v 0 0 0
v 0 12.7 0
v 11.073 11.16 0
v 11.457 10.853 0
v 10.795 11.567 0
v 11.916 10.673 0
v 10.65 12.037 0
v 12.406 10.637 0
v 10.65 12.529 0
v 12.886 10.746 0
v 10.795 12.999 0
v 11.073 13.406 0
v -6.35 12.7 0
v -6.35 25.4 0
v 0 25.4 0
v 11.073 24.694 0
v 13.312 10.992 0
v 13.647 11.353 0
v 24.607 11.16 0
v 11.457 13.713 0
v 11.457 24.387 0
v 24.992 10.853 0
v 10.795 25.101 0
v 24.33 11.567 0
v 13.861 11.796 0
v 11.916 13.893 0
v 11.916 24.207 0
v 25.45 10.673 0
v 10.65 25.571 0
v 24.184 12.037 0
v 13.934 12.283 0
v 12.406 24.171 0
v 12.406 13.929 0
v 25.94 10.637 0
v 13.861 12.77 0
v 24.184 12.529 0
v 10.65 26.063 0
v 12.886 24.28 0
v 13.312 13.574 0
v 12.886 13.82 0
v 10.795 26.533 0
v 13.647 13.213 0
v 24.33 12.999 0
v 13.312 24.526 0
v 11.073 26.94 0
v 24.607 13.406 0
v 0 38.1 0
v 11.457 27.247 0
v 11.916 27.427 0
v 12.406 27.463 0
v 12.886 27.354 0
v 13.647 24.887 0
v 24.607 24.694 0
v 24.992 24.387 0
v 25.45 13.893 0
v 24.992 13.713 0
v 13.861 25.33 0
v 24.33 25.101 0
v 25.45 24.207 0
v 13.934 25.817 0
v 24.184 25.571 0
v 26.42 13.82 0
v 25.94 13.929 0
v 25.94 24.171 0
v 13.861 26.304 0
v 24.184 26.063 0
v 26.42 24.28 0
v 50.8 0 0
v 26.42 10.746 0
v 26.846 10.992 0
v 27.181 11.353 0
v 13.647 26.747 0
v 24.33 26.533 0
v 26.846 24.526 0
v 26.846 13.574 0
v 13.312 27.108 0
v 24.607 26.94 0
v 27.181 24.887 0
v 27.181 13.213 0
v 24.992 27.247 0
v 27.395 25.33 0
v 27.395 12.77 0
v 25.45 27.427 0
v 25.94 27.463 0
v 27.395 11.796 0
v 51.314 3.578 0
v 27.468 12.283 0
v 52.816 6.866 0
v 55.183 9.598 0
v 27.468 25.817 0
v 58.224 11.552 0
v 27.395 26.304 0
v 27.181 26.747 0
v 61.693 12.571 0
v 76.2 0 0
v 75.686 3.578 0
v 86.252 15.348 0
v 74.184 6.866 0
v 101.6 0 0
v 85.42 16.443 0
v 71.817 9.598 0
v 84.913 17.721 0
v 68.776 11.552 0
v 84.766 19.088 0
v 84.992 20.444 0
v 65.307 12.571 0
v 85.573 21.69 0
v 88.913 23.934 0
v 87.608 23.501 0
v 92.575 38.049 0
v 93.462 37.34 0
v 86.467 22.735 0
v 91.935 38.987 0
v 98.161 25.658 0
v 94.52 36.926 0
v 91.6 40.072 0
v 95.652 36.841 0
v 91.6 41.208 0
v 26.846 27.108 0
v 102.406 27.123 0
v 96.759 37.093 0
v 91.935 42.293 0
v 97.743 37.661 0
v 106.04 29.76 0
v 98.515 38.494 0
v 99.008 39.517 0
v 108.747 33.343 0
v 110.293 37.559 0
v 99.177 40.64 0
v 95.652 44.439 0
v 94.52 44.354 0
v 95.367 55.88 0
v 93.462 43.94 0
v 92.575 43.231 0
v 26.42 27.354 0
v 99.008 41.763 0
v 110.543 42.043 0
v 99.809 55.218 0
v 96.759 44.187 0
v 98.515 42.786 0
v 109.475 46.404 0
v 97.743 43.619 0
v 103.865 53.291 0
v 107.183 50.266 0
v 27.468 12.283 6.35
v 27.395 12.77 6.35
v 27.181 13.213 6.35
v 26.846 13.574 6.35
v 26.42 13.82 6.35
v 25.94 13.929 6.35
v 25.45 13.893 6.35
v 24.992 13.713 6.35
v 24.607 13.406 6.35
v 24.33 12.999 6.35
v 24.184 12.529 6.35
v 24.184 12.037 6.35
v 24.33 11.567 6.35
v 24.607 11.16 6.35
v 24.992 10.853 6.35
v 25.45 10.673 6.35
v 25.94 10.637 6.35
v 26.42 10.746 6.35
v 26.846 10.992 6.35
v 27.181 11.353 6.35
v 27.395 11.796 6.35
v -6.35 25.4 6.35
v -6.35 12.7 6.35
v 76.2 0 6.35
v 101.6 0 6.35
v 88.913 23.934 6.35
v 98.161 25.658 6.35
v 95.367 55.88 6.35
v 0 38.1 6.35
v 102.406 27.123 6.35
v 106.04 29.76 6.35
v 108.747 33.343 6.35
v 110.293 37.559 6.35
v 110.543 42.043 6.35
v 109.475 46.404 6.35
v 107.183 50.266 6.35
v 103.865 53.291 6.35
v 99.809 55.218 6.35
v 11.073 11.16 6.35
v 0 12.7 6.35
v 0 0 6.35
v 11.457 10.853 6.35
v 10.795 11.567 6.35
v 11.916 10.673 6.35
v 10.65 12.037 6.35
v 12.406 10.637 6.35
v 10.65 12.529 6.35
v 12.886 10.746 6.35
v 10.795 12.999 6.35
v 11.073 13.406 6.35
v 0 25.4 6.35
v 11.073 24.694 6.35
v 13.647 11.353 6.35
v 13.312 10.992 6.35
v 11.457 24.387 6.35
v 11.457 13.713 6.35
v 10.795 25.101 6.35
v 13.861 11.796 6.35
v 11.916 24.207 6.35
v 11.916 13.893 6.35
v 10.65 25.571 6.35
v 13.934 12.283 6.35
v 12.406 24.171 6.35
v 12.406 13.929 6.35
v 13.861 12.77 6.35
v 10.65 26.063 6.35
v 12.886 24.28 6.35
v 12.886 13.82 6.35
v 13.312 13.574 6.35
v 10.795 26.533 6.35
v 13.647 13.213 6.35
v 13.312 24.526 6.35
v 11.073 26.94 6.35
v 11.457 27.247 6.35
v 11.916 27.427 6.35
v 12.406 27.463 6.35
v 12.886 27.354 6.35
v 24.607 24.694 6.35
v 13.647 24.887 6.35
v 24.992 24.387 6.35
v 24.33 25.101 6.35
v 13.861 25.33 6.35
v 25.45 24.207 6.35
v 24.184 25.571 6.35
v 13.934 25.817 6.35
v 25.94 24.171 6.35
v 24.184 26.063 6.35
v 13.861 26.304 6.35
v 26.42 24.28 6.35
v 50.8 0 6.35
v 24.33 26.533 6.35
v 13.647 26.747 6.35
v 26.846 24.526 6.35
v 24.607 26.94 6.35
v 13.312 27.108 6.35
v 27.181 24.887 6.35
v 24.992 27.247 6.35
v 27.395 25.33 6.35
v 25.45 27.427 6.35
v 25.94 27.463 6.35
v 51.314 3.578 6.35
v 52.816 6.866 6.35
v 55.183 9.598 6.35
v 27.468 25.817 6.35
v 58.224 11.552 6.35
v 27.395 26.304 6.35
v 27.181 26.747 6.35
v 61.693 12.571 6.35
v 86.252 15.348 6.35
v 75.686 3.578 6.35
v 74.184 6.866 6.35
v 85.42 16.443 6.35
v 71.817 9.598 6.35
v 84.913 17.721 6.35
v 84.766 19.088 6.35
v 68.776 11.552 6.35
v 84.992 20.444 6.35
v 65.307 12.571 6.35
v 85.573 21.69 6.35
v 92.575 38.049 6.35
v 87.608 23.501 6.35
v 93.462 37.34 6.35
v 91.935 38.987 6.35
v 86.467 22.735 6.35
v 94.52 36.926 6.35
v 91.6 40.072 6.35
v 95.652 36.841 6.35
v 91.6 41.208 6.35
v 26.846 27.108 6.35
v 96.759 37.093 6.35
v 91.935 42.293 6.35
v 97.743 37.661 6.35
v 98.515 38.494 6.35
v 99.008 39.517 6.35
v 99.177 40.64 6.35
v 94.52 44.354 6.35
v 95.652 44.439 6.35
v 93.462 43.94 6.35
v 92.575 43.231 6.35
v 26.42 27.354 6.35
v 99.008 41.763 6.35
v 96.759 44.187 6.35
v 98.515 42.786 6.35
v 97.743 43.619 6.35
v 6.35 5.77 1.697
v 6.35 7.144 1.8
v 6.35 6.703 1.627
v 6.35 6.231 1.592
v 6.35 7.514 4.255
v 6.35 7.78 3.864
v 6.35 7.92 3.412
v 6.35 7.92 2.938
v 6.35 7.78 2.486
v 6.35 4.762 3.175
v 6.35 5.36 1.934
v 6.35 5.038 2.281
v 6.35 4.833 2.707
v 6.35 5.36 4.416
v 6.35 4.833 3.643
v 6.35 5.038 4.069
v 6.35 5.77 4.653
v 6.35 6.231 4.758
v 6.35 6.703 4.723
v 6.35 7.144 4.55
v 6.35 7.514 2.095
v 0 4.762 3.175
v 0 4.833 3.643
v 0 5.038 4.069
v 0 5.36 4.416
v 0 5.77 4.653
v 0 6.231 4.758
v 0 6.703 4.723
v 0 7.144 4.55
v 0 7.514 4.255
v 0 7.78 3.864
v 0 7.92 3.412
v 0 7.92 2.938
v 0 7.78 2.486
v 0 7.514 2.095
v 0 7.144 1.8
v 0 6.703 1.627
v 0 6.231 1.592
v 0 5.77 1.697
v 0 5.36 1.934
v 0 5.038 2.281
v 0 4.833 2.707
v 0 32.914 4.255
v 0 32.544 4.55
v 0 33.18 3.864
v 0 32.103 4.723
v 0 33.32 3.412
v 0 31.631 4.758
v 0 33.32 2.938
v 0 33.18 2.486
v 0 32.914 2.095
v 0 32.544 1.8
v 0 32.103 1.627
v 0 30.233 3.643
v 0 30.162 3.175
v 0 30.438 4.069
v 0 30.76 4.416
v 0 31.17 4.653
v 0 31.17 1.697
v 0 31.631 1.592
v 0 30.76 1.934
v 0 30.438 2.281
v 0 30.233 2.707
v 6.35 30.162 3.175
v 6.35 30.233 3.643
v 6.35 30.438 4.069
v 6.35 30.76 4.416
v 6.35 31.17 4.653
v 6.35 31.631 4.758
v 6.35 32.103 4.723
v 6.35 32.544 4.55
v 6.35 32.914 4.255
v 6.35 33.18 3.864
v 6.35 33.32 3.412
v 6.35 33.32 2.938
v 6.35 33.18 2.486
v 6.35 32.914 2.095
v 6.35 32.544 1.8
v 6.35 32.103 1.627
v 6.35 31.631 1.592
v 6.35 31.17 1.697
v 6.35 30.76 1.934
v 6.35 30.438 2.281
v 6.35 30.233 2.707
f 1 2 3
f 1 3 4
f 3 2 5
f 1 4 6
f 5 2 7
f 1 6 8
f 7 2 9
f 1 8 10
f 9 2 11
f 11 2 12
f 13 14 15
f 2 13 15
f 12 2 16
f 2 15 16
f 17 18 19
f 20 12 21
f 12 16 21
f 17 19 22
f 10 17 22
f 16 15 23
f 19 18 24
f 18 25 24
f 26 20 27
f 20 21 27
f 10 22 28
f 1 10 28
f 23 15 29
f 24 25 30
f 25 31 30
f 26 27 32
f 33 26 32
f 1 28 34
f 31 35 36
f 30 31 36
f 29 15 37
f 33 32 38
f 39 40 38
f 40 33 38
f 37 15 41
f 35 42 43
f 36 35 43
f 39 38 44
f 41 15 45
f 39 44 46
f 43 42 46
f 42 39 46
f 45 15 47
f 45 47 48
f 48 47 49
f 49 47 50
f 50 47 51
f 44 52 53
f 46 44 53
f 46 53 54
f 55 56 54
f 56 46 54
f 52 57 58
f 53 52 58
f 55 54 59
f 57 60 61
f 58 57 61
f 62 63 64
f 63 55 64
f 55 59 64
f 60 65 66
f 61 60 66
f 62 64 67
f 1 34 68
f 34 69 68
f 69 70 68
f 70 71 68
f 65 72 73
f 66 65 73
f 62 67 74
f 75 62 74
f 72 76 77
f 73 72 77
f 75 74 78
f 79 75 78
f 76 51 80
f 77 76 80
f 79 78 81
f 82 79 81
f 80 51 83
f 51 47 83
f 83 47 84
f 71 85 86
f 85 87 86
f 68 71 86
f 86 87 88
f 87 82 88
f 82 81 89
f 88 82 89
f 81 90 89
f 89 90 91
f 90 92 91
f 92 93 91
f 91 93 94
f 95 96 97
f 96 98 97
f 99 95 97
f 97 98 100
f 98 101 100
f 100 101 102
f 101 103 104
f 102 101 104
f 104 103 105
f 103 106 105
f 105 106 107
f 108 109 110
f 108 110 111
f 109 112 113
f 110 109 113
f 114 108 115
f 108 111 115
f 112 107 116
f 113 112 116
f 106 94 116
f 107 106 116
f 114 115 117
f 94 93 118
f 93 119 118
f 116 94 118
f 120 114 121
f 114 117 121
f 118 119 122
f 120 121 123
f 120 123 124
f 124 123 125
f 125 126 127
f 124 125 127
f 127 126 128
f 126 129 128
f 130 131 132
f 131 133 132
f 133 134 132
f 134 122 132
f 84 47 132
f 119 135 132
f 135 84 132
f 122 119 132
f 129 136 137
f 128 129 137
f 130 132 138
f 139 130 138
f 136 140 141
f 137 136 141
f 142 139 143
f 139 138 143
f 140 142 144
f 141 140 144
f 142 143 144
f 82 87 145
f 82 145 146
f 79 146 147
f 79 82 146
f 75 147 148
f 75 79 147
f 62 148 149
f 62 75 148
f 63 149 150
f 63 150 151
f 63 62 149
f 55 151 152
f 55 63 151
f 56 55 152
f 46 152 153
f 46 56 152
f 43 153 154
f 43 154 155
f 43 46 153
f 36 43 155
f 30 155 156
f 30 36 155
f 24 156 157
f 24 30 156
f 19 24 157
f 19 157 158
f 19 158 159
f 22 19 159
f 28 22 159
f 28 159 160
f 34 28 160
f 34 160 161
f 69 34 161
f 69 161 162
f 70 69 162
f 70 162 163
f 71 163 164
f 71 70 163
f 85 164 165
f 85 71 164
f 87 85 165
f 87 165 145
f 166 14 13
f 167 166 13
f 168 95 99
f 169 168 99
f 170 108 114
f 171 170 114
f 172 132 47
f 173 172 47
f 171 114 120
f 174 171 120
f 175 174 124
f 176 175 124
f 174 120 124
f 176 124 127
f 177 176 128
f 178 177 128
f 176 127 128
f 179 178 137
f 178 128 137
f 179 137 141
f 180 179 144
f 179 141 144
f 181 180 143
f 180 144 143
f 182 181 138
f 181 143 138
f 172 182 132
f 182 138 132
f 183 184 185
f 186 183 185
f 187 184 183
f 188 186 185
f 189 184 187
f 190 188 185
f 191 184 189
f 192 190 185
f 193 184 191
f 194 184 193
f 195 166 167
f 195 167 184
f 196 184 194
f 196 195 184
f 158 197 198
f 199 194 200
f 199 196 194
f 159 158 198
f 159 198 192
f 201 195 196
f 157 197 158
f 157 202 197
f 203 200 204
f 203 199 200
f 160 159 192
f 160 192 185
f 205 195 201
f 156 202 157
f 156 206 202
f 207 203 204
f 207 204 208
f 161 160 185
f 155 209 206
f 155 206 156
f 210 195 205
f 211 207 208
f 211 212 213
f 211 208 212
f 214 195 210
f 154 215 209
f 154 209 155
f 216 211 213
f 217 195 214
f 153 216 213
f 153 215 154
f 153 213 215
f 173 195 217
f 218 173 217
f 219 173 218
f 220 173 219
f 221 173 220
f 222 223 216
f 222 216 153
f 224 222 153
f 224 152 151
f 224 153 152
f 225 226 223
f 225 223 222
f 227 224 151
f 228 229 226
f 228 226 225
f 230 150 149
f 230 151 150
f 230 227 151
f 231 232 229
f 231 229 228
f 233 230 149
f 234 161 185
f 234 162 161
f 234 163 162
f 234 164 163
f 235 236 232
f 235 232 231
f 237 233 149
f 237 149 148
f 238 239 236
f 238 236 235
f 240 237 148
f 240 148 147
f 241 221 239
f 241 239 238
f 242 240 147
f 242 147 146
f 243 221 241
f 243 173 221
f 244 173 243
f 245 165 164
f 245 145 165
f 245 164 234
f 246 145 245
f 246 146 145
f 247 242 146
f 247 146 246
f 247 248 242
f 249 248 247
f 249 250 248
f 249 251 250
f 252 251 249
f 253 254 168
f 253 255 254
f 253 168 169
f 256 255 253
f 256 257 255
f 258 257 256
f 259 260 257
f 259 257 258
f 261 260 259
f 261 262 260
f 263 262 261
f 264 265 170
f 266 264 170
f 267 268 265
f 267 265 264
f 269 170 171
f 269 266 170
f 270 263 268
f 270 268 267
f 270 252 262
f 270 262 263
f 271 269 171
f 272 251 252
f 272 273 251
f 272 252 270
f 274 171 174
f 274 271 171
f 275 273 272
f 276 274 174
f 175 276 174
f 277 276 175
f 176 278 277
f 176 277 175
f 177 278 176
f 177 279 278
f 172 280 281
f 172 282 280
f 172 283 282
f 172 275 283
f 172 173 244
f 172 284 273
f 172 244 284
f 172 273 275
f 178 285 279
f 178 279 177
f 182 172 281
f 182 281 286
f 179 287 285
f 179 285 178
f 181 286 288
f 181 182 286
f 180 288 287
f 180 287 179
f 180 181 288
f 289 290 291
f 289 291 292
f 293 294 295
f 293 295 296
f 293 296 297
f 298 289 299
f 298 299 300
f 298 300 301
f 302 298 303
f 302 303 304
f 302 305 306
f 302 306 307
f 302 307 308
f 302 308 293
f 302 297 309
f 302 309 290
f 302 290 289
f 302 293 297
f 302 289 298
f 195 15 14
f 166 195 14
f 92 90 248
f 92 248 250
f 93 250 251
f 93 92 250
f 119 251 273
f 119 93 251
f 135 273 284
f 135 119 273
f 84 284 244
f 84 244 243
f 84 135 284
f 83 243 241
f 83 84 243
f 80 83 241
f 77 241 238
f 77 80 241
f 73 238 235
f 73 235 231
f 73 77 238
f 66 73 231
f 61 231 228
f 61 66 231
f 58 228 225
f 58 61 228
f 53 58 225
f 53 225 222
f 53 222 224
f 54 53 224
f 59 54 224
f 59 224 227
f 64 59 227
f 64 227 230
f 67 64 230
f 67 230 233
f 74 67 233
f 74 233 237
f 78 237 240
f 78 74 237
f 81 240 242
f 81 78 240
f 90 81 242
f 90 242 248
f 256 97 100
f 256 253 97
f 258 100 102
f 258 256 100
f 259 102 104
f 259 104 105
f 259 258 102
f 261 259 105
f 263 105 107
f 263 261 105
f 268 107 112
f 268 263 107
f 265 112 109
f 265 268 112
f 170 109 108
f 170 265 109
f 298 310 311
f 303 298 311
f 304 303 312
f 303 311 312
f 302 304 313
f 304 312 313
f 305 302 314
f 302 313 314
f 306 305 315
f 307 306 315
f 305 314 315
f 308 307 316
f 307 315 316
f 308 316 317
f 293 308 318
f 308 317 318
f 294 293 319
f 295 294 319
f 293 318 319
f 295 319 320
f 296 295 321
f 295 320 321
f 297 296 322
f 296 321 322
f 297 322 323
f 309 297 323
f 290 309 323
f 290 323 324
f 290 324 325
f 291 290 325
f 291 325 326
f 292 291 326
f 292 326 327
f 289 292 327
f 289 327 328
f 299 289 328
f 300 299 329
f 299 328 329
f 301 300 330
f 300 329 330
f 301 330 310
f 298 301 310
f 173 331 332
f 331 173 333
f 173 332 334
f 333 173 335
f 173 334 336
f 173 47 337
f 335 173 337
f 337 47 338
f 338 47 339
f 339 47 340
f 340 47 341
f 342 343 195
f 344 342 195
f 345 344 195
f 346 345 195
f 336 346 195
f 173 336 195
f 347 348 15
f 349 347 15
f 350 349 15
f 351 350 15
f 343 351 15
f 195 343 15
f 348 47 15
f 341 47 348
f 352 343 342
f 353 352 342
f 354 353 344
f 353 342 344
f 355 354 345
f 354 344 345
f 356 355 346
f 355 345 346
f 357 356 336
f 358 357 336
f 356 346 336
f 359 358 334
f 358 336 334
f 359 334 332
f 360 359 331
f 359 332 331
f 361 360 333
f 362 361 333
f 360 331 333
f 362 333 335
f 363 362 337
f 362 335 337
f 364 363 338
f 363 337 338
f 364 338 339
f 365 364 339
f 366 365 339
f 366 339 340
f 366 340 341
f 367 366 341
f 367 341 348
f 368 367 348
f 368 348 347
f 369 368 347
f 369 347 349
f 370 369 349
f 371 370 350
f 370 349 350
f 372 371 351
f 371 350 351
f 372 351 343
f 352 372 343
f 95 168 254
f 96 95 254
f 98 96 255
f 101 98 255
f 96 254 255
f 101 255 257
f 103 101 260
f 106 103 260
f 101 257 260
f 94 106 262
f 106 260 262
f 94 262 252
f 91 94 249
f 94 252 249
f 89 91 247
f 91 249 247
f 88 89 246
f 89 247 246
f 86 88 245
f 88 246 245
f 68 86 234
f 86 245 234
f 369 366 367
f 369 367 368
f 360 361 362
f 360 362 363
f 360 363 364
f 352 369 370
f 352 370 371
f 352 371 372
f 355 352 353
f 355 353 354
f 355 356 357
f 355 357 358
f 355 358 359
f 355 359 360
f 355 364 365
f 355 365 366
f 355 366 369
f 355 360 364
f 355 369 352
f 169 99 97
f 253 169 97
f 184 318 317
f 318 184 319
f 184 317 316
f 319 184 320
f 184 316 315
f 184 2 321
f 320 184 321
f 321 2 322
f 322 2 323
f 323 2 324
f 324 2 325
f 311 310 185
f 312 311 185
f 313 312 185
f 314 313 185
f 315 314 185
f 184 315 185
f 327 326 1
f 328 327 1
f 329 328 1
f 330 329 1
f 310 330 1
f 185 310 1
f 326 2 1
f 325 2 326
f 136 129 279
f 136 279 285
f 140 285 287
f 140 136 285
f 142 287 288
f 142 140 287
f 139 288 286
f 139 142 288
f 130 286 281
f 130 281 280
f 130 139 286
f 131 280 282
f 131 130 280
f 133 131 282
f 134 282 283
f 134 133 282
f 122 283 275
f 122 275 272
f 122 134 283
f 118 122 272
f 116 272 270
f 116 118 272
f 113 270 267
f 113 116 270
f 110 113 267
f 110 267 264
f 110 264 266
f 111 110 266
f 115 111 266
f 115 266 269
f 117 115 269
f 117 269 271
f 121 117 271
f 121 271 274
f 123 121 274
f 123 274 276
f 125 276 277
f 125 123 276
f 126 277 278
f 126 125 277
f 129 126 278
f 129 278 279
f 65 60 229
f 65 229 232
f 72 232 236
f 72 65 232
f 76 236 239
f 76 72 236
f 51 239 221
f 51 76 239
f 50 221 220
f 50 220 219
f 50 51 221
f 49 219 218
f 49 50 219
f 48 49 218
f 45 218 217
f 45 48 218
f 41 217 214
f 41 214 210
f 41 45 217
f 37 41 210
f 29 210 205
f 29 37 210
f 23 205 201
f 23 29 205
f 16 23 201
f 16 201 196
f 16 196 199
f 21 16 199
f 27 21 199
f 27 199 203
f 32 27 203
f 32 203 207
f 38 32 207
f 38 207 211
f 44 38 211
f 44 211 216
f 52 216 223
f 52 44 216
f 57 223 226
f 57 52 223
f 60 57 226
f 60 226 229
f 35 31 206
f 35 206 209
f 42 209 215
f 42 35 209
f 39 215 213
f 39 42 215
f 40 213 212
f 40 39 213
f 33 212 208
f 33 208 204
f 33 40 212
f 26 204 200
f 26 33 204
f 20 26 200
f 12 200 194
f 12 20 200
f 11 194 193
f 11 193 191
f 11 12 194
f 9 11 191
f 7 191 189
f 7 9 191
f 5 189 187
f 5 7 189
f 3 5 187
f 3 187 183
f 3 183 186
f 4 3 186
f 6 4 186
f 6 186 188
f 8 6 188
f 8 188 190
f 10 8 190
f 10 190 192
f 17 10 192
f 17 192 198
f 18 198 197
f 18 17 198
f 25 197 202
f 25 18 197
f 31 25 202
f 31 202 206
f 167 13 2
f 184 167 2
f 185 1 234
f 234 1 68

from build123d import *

# Parameters (mm, degrees)
SKETCH1_R           = 3.81
SKETCH1_R_2         = 1.651
BOSS_EXTRUDE1_DEPTH = 6.35
FILLET2_R           = 5.08
SKETCH3_R           = 1.5875
CUT_EXTRUDE1_DEPTH  = 6.35
CUT_EXTRUDE2_DEPTH  = 6.35


with BuildPart() as part:
    # Sketch1 → Boss-Extrude1 (new body)
    with BuildSketch(Plane.XY):
        with BuildLine():
            Line((0, 0), (101.6, 0))
            Line((101.6, 0), (79.43330905, 22.16669095))
            Line((79.43330905, 22.16669095), (98.16062093, 25.658150496))
            ThreePointArc((98.16062093, 25.658150496), (110.542778436, 42.04253584), (95.367453293, 55.88))
            Line((95.367453293, 55.88), (0, 38.1))
            Line((0, 38.1), (0, 25.4))
            Line((0, 25.4), (-6.35, 25.4))
            Line((-6.35, 25.4), (-6.35, 12.7))
            Line((-6.35, 12.7), (0, 12.7))
            Line((0, 12.7), (0, 0))
        make_face()
        with Locations((95.367453293, 40.64)):
            Circle(SKETCH1_R, mode=Mode.SUBTRACT)
        with Locations((25.817011896, 25.817011896)):
            Circle(SKETCH1_R_2, mode=Mode.SUBTRACT)
        with Locations((25.817011896, 12.282988104)):
            Circle(SKETCH1_R_2, mode=Mode.SUBTRACT)
        with Locations((12.282988104, 12.282988104)):
            Circle(SKETCH1_R_2, mode=Mode.SUBTRACT)
        with Locations((12.282988104, 25.817011896)):
            Circle(SKETCH1_R_2, mode=Mode.SUBTRACT)
    extrude(amount=BOSS_EXTRUDE1_DEPTH)

    # Fillet2
    fillet2_edges = [part.edges().sort_by_distance(p)[0] for p in [
        (79.43330905, 22.16669095, 3.175),
    ]]
    fillet(fillet2_edges, radius=FILLET2_R)

    # Sketch3 → Cut-Extrude1 (cut)
    with BuildSketch(Plane.ZY):
        with Locations(Location((3.175, 31.75, 0), (0, 0, 270))):
            Circle(SKETCH3_R)
        with Locations(Location((3.175, 6.35, 0), (0, 0, 270))):
            Circle(SKETCH3_R)
    extrude(amount=-CUT_EXTRUDE1_DEPTH, mode=Mode.SUBTRACT)

    # Sketch6 → Cut-Extrude2 (cut)
    with BuildSketch(Plane.XY.offset(6.35)):
        with BuildLine():
            Line((50.8, 0), (76.2, 0))
            ThreePointArc((76.2, 0), (63.5, 12.7), (50.8, 0))
        make_face()
    extrude(amount=-CUT_EXTRUDE2_DEPTH, mode=Mode.SUBTRACT)


solid = part.part
